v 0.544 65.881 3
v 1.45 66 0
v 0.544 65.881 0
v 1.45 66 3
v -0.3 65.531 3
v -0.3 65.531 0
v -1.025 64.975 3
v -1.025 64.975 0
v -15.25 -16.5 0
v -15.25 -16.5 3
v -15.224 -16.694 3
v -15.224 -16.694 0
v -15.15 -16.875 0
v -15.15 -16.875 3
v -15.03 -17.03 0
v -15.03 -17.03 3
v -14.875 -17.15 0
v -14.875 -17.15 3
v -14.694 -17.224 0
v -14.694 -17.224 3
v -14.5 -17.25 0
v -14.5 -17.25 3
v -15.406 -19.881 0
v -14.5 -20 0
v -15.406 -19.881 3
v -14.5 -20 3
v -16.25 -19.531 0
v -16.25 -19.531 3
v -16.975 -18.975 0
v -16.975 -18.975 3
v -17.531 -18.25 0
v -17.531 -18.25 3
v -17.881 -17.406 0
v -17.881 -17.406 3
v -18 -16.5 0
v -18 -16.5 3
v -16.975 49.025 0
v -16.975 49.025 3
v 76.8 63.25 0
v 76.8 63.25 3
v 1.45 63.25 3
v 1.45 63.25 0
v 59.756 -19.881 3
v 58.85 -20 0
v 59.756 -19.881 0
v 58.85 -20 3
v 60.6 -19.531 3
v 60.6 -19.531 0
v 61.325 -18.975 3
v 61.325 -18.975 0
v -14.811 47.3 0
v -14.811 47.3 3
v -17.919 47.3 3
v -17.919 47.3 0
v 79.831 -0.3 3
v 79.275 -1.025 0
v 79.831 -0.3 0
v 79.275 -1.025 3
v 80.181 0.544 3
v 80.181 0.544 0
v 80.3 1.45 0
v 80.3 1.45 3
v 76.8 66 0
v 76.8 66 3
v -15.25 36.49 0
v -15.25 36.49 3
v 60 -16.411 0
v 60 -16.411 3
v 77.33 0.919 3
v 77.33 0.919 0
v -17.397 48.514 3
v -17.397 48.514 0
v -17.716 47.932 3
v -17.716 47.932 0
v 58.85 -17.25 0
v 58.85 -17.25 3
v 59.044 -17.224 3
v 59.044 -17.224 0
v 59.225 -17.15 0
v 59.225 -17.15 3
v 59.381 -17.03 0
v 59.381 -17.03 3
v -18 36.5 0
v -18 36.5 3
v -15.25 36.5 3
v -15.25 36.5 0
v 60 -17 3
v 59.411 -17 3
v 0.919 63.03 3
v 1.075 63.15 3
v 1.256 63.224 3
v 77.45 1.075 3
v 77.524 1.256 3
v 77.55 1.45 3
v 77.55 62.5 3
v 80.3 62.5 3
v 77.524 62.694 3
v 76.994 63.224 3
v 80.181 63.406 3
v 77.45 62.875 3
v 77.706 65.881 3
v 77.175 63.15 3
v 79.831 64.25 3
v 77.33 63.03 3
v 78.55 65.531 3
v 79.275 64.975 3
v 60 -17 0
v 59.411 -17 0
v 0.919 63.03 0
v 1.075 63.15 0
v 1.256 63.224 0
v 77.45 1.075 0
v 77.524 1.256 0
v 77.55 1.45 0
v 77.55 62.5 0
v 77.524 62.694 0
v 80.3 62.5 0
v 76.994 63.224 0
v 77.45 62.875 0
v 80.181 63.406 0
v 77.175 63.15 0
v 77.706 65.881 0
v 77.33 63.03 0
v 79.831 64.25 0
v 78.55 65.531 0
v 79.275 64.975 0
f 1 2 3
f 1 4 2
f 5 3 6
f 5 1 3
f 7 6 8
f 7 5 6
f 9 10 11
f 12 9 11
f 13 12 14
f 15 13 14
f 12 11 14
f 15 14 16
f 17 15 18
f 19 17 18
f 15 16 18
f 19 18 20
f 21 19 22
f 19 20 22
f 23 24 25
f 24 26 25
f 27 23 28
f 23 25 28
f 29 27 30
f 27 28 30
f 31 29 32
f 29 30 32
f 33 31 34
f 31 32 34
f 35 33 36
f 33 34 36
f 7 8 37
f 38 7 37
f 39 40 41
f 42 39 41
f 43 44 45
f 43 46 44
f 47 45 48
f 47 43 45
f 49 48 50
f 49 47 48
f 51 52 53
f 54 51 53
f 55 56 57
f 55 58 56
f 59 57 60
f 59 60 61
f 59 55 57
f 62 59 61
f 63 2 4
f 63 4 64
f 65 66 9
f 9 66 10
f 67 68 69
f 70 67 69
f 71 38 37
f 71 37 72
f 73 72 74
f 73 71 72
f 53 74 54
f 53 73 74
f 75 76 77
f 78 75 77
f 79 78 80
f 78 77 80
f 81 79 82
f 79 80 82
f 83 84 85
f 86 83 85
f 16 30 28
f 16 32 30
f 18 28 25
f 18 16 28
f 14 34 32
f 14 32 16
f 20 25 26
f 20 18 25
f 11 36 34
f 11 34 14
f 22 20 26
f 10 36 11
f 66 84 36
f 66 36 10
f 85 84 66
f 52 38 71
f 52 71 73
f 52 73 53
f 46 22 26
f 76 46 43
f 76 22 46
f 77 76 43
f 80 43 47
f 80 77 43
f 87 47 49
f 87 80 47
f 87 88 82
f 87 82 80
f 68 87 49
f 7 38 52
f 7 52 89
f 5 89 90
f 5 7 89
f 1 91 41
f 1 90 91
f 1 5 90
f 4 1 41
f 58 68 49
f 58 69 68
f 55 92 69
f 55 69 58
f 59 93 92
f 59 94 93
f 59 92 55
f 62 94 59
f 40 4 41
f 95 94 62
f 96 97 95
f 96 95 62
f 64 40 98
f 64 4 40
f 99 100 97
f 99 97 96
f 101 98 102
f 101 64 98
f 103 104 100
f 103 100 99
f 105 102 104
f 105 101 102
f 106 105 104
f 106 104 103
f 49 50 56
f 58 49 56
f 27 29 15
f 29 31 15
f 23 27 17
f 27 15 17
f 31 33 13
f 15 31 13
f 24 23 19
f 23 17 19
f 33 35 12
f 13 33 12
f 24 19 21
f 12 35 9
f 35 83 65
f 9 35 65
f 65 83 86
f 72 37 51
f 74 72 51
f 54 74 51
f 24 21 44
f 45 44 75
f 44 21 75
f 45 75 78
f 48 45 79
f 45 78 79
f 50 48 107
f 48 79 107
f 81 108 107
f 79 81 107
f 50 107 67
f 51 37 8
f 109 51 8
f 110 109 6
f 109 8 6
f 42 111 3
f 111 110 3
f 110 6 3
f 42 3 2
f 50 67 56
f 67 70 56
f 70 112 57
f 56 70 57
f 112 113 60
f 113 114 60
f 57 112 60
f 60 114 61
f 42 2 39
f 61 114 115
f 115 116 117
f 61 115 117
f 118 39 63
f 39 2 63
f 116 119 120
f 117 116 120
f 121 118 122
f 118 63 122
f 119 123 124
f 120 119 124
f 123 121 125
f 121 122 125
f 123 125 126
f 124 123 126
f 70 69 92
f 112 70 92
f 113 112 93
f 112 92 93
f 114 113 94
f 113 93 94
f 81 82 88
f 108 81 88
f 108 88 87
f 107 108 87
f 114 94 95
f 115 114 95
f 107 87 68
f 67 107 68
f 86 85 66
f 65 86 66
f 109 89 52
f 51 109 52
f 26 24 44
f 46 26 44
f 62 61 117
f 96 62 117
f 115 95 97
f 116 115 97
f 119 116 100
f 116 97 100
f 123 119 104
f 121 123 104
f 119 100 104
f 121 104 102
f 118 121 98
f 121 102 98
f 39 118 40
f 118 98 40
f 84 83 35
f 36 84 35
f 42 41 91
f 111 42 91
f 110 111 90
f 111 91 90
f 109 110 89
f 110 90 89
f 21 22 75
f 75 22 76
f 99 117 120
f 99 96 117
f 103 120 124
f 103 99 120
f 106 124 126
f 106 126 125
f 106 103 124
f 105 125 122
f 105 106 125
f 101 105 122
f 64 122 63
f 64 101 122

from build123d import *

# Parameters (mm, degrees)
BOSS_EXTRUDE1_DEPTH = 3
FILLET1_R           = 3.5
SKETCH2_W           = 72.4
SKETCH2_H           = 45
CUT_EXTRUDE1_DEPTH  = 104.986008674
SKETCH3_W           = 33
SKETCH3_H           = 18
SKETCH3_W_2         = 39
SKETCH3_H_2         = 18.5
SKETCH3_W_3         = 15
SKETCH3_H_3         = 30
CUT_EXTRUDE2_DEPTH  = 104.986008674
SKETCH4_W           = 39
SKETCH4_H           = 18.5
SKETCH4_W_2         = 15
SKETCH4_H_2         = 30
SKETCH4_W_3         = 72.4
SKETCH4_H_3         = 45
CUT_EXTRUDE3_DEPTH  = 104.986008674


with BuildPart() as part:
    # Sketch1 → Boss-Extrude1 (new body)
    with BuildSketch(Plane.XY):
        Polygon((60.3, -20), (80.3, 0), (80.3, 66), (0, 66), (-18, 48), (-18, -20), align=None)
    extrude(amount=BOSS_EXTRUDE1_DEPTH)

    # Fillet1
    fillet1_edges = [part.edges().sort_by_distance(p)[0] for p in [
        (80.3, 0, 1.5),
        (60.3, -20, 1.5),
        (-18, -20, 1.5),
        (-18, 48, 1.5),
        (80.3, 66, 1.5),
        (0, 66, 1.5),
    ]]
    fillet(fillet1_edges, radius=FILLET1_R)

    # Sketch2 → Cut-Extrude1 (cut, through all)
    with BuildSketch(Plane.XY.offset(3)):
        with Locations((39.2, 33)):
            Rectangle(SKETCH2_W, SKETCH2_H)
    extrude(amount=-CUT_EXTRUDE1_DEPTH, mode=Mode.SUBTRACT)

    # Sketch3 → Cut-Extrude2 (cut, through all)
    with BuildSketch(Plane.XY.offset(3)):
        with Locations((43.5, -8)):
            Rectangle(SKETCH3_W, SKETCH3_H)
        with Locations((4.5, -7.75)):
            Rectangle(SKETCH3_W_2, SKETCH3_H_2)
        with Locations((-7.5, 19.5)):
            Rectangle(SKETCH3_W_3, SKETCH3_H_3)
        with BuildLine():
            Line((-3, 47.3), (-17.918753974, 47.3))
            ThreePointArc((-17.918753974, 47.3), (-17.979629212, 46.927320889), (-18, 46.550252532))
            Line((-18, 46.550252532), (-18, 36.5))
            Line((-18, 36.5), (-3, 36.5))
            Line((-3, 36.5), (-3, 47.3))
        make_face()
        Polygon((63, -4.572077939), (67.242640687, -8.814718626), (71.485281374, -4.572077939), (67.242640687, -0.329437252), align=None)
    extrude(amount=-CUT_EXTRUDE2_DEPTH, mode=Mode.SUBTRACT)

    # Sketch4 → Cut-Extrude3 (cut, through all)
    with BuildSketch(Plane.XY.offset(3)):
        with BuildLine():
            Line((0.919417382, 63.030330086), (-14.810912703, 47.3))
            Line((-14.810912703, 47.3), (-3, 47.3))
            Line((-3, 47.3), (-3, 36.5))
            Line((-3, 36.5), (-15.249922187, 36.5))
            Line((-15.249922187, 36.5), (-15.25, 36.489656324))
            Line((-15.25, 36.489656324), (-15.25, -16.5))
            ThreePointArc((-15.25, -16.5), (-15.030330086, -17.030330086), (-14.5, -17.25))
            Line((-14.5, -17.25), (58.850252532, -17.25))
            ThreePointArc((58.850252532, -17.25), (59.137265106, -17.192909649), (59.380582618, -17.030330086))
            Line((59.380582618, -17.030330086), (59.410912703, -17))
            Line((59.410912703, -17), (27, -17))
            Line((27, -17), (27, 1))
            Line((27, 1), (60, 1))
            Line((60, 1), (60, -16.410912703))
            Line((60, -16.410912703), (77.330330086, 0.919417382))
            ThreePointArc((77.330330086, 0.919417382), (77.492909649, 1.162734894), (77.55, 1.449747468))
            Line((77.55, 1.449747468), (77.55, 62.5))
            ThreePointArc((77.55, 62.5), (77.330330086, 63.030330086), (76.8, 63.25))
            Line((76.8, 63.25), (1.449747468, 63.25))
            ThreePointArc((1.449747468, 63.25), (1.162734894, 63.192909649), (0.919417382, 63.030330086))
        make_face()
        with Locations((4.5, -7.75)):
            Rectangle(SKETCH4_W, SKETCH4_H, mode=Mode.SUBTRACT)
        with Locations((-7.5, 19.5)):
            Rectangle(SKETCH4_W_2, SKETCH4_H_2, mode=Mode.SUBTRACT)
        Polygon((67.242640687, -8.814718626), (63, -4.572077939), (67.242640687, -0.329437252), (71.485281374, -4.572077939), align=None, mode=Mode.SUBTRACT)
        with Locations((39.2, 33)):
            Rectangle(SKETCH4_W_3, SKETCH4_H_3, mode=Mode.SUBTRACT)
    extrude(amount=-CUT_EXTRUDE3_DEPTH, mode=Mode.SUBTRACT)


solid = part.part
